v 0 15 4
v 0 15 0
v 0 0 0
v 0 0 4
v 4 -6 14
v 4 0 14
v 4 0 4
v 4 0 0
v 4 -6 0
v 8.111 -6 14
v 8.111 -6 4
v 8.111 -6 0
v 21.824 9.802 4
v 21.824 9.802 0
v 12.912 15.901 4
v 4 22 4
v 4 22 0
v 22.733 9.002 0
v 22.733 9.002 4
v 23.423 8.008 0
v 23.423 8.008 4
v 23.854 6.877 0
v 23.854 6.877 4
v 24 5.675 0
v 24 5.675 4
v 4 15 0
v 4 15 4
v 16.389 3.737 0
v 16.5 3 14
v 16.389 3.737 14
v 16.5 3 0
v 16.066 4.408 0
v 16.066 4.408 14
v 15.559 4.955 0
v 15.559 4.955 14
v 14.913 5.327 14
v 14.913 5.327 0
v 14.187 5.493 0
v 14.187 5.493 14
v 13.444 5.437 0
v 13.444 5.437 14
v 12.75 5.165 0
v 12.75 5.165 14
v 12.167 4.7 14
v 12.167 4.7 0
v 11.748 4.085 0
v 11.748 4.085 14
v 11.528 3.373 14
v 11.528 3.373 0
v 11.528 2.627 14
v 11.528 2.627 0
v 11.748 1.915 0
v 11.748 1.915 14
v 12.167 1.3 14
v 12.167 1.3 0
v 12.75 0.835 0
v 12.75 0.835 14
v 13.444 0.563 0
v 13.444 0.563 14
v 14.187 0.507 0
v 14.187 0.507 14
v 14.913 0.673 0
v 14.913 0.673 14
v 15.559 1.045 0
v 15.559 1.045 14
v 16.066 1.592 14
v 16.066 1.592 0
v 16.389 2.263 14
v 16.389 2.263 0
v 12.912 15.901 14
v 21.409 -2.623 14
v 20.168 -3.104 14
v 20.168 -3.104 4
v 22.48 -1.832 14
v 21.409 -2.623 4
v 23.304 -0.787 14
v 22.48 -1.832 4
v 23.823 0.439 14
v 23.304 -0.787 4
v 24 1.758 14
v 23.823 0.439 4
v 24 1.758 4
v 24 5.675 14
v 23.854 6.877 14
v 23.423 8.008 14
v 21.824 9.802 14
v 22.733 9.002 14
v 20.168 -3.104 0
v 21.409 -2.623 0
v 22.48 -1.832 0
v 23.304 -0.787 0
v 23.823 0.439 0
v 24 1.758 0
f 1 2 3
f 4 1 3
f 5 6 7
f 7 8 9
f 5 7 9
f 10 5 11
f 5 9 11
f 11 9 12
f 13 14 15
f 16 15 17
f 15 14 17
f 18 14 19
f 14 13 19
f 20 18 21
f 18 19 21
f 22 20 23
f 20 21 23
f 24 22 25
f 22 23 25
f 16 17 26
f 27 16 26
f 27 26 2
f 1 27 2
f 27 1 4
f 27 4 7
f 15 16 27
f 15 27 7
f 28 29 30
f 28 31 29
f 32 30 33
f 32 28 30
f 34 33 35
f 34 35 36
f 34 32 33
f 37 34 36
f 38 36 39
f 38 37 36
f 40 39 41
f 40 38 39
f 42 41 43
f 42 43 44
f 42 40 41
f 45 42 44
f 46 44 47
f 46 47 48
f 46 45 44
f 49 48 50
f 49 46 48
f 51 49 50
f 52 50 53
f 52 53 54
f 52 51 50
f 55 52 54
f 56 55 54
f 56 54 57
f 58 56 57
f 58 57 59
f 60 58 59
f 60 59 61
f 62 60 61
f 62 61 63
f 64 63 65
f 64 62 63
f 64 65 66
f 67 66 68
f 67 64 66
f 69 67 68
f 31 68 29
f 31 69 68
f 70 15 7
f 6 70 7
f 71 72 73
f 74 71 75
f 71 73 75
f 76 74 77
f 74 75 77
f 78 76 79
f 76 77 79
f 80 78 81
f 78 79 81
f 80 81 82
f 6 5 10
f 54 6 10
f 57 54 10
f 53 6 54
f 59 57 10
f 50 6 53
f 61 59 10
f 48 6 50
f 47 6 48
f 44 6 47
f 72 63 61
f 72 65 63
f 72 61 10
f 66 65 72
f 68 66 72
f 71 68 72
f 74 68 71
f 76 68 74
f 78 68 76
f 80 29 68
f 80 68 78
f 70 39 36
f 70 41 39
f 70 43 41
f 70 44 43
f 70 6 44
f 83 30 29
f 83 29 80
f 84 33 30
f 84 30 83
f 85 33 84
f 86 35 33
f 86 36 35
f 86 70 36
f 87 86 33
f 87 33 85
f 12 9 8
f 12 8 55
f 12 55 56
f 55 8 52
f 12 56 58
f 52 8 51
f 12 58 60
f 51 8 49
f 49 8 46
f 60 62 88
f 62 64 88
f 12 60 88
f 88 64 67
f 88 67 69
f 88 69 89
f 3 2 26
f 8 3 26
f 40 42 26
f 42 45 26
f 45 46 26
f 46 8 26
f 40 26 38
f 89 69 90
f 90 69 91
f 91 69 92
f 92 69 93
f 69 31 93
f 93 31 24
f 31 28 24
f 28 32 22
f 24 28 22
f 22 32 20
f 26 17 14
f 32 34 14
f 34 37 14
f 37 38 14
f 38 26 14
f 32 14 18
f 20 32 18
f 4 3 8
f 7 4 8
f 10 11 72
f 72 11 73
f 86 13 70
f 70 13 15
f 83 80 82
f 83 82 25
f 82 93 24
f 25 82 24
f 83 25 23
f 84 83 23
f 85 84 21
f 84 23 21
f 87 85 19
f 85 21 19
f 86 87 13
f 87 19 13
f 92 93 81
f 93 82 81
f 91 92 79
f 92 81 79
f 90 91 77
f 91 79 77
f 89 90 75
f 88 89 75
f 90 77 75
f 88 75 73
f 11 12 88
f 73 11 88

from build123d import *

# Parameters (mm, degrees)
SKETCH_1_R      = 2.5
EXTRUDE_1_DEPTH = 4
FILLET_1_R      = 5
SKETCH_2_R      = 2.5
EXTRUDE_2_DEPTH = 10


with BuildPart() as part:
    # ｽｹｯﾁ1 → ﾎﾞｽ - 押し出し1 (new body)
    with BuildSketch(Plane.XY):
        Polygon((0, 15), (0, 0), (4, 0), (4, -6), (8.110763801, -6), (24, -2.18322685), (24, 8.312378031), (4, 22), (4, 15), align=None)
        with Locations((14, 3)):
            Circle(SKETCH_1_R, mode=Mode.SUBTRACT)
    extrude(amount=EXTRUDE_1_DEPTH)

    # ﾌｨﾚｯﾄ1
    fillet_1_edges = [part.edges().sort_by_distance(p)[0] for p in [
        (24, -2.18322685, 2),
        (24, 8.312378031, 2),
    ]]
    fillet(fillet_1_edges, radius=FILLET_1_R)

    # ｽｹｯﾁ2 → ﾎﾞｽ - 押し出し2 (add)
    with BuildSketch(Plane.XY.offset(4)):
        with BuildLine():
            Line((4, 0), (4, -6))
            Line((4, -6), (8.110763801, -6))
            Line((8.110763801, -6), (20.167835798, -3.103755769))
            ThreePointArc((20.167835798, -3.103755769), (22.926778514, -1.337276232), (24, 1.757947589))
            Line((24, 1.757947589), (24, 5.675452184))
            ThreePointArc((24, 5.675452184), (23.422640317, 8.007887097), (21.823898951, 9.801660457))
            Line((21.823898951, 9.801660457), (12.911949475, 15.900830229))
            Line((12.911949475, 15.900830229), (4, 0))
        make_face()
        with Locations((14, 3)):
            Circle(SKETCH_2_R, mode=Mode.SUBTRACT)
    extrude(amount=EXTRUDE_2_DEPTH)


solid = part.part
